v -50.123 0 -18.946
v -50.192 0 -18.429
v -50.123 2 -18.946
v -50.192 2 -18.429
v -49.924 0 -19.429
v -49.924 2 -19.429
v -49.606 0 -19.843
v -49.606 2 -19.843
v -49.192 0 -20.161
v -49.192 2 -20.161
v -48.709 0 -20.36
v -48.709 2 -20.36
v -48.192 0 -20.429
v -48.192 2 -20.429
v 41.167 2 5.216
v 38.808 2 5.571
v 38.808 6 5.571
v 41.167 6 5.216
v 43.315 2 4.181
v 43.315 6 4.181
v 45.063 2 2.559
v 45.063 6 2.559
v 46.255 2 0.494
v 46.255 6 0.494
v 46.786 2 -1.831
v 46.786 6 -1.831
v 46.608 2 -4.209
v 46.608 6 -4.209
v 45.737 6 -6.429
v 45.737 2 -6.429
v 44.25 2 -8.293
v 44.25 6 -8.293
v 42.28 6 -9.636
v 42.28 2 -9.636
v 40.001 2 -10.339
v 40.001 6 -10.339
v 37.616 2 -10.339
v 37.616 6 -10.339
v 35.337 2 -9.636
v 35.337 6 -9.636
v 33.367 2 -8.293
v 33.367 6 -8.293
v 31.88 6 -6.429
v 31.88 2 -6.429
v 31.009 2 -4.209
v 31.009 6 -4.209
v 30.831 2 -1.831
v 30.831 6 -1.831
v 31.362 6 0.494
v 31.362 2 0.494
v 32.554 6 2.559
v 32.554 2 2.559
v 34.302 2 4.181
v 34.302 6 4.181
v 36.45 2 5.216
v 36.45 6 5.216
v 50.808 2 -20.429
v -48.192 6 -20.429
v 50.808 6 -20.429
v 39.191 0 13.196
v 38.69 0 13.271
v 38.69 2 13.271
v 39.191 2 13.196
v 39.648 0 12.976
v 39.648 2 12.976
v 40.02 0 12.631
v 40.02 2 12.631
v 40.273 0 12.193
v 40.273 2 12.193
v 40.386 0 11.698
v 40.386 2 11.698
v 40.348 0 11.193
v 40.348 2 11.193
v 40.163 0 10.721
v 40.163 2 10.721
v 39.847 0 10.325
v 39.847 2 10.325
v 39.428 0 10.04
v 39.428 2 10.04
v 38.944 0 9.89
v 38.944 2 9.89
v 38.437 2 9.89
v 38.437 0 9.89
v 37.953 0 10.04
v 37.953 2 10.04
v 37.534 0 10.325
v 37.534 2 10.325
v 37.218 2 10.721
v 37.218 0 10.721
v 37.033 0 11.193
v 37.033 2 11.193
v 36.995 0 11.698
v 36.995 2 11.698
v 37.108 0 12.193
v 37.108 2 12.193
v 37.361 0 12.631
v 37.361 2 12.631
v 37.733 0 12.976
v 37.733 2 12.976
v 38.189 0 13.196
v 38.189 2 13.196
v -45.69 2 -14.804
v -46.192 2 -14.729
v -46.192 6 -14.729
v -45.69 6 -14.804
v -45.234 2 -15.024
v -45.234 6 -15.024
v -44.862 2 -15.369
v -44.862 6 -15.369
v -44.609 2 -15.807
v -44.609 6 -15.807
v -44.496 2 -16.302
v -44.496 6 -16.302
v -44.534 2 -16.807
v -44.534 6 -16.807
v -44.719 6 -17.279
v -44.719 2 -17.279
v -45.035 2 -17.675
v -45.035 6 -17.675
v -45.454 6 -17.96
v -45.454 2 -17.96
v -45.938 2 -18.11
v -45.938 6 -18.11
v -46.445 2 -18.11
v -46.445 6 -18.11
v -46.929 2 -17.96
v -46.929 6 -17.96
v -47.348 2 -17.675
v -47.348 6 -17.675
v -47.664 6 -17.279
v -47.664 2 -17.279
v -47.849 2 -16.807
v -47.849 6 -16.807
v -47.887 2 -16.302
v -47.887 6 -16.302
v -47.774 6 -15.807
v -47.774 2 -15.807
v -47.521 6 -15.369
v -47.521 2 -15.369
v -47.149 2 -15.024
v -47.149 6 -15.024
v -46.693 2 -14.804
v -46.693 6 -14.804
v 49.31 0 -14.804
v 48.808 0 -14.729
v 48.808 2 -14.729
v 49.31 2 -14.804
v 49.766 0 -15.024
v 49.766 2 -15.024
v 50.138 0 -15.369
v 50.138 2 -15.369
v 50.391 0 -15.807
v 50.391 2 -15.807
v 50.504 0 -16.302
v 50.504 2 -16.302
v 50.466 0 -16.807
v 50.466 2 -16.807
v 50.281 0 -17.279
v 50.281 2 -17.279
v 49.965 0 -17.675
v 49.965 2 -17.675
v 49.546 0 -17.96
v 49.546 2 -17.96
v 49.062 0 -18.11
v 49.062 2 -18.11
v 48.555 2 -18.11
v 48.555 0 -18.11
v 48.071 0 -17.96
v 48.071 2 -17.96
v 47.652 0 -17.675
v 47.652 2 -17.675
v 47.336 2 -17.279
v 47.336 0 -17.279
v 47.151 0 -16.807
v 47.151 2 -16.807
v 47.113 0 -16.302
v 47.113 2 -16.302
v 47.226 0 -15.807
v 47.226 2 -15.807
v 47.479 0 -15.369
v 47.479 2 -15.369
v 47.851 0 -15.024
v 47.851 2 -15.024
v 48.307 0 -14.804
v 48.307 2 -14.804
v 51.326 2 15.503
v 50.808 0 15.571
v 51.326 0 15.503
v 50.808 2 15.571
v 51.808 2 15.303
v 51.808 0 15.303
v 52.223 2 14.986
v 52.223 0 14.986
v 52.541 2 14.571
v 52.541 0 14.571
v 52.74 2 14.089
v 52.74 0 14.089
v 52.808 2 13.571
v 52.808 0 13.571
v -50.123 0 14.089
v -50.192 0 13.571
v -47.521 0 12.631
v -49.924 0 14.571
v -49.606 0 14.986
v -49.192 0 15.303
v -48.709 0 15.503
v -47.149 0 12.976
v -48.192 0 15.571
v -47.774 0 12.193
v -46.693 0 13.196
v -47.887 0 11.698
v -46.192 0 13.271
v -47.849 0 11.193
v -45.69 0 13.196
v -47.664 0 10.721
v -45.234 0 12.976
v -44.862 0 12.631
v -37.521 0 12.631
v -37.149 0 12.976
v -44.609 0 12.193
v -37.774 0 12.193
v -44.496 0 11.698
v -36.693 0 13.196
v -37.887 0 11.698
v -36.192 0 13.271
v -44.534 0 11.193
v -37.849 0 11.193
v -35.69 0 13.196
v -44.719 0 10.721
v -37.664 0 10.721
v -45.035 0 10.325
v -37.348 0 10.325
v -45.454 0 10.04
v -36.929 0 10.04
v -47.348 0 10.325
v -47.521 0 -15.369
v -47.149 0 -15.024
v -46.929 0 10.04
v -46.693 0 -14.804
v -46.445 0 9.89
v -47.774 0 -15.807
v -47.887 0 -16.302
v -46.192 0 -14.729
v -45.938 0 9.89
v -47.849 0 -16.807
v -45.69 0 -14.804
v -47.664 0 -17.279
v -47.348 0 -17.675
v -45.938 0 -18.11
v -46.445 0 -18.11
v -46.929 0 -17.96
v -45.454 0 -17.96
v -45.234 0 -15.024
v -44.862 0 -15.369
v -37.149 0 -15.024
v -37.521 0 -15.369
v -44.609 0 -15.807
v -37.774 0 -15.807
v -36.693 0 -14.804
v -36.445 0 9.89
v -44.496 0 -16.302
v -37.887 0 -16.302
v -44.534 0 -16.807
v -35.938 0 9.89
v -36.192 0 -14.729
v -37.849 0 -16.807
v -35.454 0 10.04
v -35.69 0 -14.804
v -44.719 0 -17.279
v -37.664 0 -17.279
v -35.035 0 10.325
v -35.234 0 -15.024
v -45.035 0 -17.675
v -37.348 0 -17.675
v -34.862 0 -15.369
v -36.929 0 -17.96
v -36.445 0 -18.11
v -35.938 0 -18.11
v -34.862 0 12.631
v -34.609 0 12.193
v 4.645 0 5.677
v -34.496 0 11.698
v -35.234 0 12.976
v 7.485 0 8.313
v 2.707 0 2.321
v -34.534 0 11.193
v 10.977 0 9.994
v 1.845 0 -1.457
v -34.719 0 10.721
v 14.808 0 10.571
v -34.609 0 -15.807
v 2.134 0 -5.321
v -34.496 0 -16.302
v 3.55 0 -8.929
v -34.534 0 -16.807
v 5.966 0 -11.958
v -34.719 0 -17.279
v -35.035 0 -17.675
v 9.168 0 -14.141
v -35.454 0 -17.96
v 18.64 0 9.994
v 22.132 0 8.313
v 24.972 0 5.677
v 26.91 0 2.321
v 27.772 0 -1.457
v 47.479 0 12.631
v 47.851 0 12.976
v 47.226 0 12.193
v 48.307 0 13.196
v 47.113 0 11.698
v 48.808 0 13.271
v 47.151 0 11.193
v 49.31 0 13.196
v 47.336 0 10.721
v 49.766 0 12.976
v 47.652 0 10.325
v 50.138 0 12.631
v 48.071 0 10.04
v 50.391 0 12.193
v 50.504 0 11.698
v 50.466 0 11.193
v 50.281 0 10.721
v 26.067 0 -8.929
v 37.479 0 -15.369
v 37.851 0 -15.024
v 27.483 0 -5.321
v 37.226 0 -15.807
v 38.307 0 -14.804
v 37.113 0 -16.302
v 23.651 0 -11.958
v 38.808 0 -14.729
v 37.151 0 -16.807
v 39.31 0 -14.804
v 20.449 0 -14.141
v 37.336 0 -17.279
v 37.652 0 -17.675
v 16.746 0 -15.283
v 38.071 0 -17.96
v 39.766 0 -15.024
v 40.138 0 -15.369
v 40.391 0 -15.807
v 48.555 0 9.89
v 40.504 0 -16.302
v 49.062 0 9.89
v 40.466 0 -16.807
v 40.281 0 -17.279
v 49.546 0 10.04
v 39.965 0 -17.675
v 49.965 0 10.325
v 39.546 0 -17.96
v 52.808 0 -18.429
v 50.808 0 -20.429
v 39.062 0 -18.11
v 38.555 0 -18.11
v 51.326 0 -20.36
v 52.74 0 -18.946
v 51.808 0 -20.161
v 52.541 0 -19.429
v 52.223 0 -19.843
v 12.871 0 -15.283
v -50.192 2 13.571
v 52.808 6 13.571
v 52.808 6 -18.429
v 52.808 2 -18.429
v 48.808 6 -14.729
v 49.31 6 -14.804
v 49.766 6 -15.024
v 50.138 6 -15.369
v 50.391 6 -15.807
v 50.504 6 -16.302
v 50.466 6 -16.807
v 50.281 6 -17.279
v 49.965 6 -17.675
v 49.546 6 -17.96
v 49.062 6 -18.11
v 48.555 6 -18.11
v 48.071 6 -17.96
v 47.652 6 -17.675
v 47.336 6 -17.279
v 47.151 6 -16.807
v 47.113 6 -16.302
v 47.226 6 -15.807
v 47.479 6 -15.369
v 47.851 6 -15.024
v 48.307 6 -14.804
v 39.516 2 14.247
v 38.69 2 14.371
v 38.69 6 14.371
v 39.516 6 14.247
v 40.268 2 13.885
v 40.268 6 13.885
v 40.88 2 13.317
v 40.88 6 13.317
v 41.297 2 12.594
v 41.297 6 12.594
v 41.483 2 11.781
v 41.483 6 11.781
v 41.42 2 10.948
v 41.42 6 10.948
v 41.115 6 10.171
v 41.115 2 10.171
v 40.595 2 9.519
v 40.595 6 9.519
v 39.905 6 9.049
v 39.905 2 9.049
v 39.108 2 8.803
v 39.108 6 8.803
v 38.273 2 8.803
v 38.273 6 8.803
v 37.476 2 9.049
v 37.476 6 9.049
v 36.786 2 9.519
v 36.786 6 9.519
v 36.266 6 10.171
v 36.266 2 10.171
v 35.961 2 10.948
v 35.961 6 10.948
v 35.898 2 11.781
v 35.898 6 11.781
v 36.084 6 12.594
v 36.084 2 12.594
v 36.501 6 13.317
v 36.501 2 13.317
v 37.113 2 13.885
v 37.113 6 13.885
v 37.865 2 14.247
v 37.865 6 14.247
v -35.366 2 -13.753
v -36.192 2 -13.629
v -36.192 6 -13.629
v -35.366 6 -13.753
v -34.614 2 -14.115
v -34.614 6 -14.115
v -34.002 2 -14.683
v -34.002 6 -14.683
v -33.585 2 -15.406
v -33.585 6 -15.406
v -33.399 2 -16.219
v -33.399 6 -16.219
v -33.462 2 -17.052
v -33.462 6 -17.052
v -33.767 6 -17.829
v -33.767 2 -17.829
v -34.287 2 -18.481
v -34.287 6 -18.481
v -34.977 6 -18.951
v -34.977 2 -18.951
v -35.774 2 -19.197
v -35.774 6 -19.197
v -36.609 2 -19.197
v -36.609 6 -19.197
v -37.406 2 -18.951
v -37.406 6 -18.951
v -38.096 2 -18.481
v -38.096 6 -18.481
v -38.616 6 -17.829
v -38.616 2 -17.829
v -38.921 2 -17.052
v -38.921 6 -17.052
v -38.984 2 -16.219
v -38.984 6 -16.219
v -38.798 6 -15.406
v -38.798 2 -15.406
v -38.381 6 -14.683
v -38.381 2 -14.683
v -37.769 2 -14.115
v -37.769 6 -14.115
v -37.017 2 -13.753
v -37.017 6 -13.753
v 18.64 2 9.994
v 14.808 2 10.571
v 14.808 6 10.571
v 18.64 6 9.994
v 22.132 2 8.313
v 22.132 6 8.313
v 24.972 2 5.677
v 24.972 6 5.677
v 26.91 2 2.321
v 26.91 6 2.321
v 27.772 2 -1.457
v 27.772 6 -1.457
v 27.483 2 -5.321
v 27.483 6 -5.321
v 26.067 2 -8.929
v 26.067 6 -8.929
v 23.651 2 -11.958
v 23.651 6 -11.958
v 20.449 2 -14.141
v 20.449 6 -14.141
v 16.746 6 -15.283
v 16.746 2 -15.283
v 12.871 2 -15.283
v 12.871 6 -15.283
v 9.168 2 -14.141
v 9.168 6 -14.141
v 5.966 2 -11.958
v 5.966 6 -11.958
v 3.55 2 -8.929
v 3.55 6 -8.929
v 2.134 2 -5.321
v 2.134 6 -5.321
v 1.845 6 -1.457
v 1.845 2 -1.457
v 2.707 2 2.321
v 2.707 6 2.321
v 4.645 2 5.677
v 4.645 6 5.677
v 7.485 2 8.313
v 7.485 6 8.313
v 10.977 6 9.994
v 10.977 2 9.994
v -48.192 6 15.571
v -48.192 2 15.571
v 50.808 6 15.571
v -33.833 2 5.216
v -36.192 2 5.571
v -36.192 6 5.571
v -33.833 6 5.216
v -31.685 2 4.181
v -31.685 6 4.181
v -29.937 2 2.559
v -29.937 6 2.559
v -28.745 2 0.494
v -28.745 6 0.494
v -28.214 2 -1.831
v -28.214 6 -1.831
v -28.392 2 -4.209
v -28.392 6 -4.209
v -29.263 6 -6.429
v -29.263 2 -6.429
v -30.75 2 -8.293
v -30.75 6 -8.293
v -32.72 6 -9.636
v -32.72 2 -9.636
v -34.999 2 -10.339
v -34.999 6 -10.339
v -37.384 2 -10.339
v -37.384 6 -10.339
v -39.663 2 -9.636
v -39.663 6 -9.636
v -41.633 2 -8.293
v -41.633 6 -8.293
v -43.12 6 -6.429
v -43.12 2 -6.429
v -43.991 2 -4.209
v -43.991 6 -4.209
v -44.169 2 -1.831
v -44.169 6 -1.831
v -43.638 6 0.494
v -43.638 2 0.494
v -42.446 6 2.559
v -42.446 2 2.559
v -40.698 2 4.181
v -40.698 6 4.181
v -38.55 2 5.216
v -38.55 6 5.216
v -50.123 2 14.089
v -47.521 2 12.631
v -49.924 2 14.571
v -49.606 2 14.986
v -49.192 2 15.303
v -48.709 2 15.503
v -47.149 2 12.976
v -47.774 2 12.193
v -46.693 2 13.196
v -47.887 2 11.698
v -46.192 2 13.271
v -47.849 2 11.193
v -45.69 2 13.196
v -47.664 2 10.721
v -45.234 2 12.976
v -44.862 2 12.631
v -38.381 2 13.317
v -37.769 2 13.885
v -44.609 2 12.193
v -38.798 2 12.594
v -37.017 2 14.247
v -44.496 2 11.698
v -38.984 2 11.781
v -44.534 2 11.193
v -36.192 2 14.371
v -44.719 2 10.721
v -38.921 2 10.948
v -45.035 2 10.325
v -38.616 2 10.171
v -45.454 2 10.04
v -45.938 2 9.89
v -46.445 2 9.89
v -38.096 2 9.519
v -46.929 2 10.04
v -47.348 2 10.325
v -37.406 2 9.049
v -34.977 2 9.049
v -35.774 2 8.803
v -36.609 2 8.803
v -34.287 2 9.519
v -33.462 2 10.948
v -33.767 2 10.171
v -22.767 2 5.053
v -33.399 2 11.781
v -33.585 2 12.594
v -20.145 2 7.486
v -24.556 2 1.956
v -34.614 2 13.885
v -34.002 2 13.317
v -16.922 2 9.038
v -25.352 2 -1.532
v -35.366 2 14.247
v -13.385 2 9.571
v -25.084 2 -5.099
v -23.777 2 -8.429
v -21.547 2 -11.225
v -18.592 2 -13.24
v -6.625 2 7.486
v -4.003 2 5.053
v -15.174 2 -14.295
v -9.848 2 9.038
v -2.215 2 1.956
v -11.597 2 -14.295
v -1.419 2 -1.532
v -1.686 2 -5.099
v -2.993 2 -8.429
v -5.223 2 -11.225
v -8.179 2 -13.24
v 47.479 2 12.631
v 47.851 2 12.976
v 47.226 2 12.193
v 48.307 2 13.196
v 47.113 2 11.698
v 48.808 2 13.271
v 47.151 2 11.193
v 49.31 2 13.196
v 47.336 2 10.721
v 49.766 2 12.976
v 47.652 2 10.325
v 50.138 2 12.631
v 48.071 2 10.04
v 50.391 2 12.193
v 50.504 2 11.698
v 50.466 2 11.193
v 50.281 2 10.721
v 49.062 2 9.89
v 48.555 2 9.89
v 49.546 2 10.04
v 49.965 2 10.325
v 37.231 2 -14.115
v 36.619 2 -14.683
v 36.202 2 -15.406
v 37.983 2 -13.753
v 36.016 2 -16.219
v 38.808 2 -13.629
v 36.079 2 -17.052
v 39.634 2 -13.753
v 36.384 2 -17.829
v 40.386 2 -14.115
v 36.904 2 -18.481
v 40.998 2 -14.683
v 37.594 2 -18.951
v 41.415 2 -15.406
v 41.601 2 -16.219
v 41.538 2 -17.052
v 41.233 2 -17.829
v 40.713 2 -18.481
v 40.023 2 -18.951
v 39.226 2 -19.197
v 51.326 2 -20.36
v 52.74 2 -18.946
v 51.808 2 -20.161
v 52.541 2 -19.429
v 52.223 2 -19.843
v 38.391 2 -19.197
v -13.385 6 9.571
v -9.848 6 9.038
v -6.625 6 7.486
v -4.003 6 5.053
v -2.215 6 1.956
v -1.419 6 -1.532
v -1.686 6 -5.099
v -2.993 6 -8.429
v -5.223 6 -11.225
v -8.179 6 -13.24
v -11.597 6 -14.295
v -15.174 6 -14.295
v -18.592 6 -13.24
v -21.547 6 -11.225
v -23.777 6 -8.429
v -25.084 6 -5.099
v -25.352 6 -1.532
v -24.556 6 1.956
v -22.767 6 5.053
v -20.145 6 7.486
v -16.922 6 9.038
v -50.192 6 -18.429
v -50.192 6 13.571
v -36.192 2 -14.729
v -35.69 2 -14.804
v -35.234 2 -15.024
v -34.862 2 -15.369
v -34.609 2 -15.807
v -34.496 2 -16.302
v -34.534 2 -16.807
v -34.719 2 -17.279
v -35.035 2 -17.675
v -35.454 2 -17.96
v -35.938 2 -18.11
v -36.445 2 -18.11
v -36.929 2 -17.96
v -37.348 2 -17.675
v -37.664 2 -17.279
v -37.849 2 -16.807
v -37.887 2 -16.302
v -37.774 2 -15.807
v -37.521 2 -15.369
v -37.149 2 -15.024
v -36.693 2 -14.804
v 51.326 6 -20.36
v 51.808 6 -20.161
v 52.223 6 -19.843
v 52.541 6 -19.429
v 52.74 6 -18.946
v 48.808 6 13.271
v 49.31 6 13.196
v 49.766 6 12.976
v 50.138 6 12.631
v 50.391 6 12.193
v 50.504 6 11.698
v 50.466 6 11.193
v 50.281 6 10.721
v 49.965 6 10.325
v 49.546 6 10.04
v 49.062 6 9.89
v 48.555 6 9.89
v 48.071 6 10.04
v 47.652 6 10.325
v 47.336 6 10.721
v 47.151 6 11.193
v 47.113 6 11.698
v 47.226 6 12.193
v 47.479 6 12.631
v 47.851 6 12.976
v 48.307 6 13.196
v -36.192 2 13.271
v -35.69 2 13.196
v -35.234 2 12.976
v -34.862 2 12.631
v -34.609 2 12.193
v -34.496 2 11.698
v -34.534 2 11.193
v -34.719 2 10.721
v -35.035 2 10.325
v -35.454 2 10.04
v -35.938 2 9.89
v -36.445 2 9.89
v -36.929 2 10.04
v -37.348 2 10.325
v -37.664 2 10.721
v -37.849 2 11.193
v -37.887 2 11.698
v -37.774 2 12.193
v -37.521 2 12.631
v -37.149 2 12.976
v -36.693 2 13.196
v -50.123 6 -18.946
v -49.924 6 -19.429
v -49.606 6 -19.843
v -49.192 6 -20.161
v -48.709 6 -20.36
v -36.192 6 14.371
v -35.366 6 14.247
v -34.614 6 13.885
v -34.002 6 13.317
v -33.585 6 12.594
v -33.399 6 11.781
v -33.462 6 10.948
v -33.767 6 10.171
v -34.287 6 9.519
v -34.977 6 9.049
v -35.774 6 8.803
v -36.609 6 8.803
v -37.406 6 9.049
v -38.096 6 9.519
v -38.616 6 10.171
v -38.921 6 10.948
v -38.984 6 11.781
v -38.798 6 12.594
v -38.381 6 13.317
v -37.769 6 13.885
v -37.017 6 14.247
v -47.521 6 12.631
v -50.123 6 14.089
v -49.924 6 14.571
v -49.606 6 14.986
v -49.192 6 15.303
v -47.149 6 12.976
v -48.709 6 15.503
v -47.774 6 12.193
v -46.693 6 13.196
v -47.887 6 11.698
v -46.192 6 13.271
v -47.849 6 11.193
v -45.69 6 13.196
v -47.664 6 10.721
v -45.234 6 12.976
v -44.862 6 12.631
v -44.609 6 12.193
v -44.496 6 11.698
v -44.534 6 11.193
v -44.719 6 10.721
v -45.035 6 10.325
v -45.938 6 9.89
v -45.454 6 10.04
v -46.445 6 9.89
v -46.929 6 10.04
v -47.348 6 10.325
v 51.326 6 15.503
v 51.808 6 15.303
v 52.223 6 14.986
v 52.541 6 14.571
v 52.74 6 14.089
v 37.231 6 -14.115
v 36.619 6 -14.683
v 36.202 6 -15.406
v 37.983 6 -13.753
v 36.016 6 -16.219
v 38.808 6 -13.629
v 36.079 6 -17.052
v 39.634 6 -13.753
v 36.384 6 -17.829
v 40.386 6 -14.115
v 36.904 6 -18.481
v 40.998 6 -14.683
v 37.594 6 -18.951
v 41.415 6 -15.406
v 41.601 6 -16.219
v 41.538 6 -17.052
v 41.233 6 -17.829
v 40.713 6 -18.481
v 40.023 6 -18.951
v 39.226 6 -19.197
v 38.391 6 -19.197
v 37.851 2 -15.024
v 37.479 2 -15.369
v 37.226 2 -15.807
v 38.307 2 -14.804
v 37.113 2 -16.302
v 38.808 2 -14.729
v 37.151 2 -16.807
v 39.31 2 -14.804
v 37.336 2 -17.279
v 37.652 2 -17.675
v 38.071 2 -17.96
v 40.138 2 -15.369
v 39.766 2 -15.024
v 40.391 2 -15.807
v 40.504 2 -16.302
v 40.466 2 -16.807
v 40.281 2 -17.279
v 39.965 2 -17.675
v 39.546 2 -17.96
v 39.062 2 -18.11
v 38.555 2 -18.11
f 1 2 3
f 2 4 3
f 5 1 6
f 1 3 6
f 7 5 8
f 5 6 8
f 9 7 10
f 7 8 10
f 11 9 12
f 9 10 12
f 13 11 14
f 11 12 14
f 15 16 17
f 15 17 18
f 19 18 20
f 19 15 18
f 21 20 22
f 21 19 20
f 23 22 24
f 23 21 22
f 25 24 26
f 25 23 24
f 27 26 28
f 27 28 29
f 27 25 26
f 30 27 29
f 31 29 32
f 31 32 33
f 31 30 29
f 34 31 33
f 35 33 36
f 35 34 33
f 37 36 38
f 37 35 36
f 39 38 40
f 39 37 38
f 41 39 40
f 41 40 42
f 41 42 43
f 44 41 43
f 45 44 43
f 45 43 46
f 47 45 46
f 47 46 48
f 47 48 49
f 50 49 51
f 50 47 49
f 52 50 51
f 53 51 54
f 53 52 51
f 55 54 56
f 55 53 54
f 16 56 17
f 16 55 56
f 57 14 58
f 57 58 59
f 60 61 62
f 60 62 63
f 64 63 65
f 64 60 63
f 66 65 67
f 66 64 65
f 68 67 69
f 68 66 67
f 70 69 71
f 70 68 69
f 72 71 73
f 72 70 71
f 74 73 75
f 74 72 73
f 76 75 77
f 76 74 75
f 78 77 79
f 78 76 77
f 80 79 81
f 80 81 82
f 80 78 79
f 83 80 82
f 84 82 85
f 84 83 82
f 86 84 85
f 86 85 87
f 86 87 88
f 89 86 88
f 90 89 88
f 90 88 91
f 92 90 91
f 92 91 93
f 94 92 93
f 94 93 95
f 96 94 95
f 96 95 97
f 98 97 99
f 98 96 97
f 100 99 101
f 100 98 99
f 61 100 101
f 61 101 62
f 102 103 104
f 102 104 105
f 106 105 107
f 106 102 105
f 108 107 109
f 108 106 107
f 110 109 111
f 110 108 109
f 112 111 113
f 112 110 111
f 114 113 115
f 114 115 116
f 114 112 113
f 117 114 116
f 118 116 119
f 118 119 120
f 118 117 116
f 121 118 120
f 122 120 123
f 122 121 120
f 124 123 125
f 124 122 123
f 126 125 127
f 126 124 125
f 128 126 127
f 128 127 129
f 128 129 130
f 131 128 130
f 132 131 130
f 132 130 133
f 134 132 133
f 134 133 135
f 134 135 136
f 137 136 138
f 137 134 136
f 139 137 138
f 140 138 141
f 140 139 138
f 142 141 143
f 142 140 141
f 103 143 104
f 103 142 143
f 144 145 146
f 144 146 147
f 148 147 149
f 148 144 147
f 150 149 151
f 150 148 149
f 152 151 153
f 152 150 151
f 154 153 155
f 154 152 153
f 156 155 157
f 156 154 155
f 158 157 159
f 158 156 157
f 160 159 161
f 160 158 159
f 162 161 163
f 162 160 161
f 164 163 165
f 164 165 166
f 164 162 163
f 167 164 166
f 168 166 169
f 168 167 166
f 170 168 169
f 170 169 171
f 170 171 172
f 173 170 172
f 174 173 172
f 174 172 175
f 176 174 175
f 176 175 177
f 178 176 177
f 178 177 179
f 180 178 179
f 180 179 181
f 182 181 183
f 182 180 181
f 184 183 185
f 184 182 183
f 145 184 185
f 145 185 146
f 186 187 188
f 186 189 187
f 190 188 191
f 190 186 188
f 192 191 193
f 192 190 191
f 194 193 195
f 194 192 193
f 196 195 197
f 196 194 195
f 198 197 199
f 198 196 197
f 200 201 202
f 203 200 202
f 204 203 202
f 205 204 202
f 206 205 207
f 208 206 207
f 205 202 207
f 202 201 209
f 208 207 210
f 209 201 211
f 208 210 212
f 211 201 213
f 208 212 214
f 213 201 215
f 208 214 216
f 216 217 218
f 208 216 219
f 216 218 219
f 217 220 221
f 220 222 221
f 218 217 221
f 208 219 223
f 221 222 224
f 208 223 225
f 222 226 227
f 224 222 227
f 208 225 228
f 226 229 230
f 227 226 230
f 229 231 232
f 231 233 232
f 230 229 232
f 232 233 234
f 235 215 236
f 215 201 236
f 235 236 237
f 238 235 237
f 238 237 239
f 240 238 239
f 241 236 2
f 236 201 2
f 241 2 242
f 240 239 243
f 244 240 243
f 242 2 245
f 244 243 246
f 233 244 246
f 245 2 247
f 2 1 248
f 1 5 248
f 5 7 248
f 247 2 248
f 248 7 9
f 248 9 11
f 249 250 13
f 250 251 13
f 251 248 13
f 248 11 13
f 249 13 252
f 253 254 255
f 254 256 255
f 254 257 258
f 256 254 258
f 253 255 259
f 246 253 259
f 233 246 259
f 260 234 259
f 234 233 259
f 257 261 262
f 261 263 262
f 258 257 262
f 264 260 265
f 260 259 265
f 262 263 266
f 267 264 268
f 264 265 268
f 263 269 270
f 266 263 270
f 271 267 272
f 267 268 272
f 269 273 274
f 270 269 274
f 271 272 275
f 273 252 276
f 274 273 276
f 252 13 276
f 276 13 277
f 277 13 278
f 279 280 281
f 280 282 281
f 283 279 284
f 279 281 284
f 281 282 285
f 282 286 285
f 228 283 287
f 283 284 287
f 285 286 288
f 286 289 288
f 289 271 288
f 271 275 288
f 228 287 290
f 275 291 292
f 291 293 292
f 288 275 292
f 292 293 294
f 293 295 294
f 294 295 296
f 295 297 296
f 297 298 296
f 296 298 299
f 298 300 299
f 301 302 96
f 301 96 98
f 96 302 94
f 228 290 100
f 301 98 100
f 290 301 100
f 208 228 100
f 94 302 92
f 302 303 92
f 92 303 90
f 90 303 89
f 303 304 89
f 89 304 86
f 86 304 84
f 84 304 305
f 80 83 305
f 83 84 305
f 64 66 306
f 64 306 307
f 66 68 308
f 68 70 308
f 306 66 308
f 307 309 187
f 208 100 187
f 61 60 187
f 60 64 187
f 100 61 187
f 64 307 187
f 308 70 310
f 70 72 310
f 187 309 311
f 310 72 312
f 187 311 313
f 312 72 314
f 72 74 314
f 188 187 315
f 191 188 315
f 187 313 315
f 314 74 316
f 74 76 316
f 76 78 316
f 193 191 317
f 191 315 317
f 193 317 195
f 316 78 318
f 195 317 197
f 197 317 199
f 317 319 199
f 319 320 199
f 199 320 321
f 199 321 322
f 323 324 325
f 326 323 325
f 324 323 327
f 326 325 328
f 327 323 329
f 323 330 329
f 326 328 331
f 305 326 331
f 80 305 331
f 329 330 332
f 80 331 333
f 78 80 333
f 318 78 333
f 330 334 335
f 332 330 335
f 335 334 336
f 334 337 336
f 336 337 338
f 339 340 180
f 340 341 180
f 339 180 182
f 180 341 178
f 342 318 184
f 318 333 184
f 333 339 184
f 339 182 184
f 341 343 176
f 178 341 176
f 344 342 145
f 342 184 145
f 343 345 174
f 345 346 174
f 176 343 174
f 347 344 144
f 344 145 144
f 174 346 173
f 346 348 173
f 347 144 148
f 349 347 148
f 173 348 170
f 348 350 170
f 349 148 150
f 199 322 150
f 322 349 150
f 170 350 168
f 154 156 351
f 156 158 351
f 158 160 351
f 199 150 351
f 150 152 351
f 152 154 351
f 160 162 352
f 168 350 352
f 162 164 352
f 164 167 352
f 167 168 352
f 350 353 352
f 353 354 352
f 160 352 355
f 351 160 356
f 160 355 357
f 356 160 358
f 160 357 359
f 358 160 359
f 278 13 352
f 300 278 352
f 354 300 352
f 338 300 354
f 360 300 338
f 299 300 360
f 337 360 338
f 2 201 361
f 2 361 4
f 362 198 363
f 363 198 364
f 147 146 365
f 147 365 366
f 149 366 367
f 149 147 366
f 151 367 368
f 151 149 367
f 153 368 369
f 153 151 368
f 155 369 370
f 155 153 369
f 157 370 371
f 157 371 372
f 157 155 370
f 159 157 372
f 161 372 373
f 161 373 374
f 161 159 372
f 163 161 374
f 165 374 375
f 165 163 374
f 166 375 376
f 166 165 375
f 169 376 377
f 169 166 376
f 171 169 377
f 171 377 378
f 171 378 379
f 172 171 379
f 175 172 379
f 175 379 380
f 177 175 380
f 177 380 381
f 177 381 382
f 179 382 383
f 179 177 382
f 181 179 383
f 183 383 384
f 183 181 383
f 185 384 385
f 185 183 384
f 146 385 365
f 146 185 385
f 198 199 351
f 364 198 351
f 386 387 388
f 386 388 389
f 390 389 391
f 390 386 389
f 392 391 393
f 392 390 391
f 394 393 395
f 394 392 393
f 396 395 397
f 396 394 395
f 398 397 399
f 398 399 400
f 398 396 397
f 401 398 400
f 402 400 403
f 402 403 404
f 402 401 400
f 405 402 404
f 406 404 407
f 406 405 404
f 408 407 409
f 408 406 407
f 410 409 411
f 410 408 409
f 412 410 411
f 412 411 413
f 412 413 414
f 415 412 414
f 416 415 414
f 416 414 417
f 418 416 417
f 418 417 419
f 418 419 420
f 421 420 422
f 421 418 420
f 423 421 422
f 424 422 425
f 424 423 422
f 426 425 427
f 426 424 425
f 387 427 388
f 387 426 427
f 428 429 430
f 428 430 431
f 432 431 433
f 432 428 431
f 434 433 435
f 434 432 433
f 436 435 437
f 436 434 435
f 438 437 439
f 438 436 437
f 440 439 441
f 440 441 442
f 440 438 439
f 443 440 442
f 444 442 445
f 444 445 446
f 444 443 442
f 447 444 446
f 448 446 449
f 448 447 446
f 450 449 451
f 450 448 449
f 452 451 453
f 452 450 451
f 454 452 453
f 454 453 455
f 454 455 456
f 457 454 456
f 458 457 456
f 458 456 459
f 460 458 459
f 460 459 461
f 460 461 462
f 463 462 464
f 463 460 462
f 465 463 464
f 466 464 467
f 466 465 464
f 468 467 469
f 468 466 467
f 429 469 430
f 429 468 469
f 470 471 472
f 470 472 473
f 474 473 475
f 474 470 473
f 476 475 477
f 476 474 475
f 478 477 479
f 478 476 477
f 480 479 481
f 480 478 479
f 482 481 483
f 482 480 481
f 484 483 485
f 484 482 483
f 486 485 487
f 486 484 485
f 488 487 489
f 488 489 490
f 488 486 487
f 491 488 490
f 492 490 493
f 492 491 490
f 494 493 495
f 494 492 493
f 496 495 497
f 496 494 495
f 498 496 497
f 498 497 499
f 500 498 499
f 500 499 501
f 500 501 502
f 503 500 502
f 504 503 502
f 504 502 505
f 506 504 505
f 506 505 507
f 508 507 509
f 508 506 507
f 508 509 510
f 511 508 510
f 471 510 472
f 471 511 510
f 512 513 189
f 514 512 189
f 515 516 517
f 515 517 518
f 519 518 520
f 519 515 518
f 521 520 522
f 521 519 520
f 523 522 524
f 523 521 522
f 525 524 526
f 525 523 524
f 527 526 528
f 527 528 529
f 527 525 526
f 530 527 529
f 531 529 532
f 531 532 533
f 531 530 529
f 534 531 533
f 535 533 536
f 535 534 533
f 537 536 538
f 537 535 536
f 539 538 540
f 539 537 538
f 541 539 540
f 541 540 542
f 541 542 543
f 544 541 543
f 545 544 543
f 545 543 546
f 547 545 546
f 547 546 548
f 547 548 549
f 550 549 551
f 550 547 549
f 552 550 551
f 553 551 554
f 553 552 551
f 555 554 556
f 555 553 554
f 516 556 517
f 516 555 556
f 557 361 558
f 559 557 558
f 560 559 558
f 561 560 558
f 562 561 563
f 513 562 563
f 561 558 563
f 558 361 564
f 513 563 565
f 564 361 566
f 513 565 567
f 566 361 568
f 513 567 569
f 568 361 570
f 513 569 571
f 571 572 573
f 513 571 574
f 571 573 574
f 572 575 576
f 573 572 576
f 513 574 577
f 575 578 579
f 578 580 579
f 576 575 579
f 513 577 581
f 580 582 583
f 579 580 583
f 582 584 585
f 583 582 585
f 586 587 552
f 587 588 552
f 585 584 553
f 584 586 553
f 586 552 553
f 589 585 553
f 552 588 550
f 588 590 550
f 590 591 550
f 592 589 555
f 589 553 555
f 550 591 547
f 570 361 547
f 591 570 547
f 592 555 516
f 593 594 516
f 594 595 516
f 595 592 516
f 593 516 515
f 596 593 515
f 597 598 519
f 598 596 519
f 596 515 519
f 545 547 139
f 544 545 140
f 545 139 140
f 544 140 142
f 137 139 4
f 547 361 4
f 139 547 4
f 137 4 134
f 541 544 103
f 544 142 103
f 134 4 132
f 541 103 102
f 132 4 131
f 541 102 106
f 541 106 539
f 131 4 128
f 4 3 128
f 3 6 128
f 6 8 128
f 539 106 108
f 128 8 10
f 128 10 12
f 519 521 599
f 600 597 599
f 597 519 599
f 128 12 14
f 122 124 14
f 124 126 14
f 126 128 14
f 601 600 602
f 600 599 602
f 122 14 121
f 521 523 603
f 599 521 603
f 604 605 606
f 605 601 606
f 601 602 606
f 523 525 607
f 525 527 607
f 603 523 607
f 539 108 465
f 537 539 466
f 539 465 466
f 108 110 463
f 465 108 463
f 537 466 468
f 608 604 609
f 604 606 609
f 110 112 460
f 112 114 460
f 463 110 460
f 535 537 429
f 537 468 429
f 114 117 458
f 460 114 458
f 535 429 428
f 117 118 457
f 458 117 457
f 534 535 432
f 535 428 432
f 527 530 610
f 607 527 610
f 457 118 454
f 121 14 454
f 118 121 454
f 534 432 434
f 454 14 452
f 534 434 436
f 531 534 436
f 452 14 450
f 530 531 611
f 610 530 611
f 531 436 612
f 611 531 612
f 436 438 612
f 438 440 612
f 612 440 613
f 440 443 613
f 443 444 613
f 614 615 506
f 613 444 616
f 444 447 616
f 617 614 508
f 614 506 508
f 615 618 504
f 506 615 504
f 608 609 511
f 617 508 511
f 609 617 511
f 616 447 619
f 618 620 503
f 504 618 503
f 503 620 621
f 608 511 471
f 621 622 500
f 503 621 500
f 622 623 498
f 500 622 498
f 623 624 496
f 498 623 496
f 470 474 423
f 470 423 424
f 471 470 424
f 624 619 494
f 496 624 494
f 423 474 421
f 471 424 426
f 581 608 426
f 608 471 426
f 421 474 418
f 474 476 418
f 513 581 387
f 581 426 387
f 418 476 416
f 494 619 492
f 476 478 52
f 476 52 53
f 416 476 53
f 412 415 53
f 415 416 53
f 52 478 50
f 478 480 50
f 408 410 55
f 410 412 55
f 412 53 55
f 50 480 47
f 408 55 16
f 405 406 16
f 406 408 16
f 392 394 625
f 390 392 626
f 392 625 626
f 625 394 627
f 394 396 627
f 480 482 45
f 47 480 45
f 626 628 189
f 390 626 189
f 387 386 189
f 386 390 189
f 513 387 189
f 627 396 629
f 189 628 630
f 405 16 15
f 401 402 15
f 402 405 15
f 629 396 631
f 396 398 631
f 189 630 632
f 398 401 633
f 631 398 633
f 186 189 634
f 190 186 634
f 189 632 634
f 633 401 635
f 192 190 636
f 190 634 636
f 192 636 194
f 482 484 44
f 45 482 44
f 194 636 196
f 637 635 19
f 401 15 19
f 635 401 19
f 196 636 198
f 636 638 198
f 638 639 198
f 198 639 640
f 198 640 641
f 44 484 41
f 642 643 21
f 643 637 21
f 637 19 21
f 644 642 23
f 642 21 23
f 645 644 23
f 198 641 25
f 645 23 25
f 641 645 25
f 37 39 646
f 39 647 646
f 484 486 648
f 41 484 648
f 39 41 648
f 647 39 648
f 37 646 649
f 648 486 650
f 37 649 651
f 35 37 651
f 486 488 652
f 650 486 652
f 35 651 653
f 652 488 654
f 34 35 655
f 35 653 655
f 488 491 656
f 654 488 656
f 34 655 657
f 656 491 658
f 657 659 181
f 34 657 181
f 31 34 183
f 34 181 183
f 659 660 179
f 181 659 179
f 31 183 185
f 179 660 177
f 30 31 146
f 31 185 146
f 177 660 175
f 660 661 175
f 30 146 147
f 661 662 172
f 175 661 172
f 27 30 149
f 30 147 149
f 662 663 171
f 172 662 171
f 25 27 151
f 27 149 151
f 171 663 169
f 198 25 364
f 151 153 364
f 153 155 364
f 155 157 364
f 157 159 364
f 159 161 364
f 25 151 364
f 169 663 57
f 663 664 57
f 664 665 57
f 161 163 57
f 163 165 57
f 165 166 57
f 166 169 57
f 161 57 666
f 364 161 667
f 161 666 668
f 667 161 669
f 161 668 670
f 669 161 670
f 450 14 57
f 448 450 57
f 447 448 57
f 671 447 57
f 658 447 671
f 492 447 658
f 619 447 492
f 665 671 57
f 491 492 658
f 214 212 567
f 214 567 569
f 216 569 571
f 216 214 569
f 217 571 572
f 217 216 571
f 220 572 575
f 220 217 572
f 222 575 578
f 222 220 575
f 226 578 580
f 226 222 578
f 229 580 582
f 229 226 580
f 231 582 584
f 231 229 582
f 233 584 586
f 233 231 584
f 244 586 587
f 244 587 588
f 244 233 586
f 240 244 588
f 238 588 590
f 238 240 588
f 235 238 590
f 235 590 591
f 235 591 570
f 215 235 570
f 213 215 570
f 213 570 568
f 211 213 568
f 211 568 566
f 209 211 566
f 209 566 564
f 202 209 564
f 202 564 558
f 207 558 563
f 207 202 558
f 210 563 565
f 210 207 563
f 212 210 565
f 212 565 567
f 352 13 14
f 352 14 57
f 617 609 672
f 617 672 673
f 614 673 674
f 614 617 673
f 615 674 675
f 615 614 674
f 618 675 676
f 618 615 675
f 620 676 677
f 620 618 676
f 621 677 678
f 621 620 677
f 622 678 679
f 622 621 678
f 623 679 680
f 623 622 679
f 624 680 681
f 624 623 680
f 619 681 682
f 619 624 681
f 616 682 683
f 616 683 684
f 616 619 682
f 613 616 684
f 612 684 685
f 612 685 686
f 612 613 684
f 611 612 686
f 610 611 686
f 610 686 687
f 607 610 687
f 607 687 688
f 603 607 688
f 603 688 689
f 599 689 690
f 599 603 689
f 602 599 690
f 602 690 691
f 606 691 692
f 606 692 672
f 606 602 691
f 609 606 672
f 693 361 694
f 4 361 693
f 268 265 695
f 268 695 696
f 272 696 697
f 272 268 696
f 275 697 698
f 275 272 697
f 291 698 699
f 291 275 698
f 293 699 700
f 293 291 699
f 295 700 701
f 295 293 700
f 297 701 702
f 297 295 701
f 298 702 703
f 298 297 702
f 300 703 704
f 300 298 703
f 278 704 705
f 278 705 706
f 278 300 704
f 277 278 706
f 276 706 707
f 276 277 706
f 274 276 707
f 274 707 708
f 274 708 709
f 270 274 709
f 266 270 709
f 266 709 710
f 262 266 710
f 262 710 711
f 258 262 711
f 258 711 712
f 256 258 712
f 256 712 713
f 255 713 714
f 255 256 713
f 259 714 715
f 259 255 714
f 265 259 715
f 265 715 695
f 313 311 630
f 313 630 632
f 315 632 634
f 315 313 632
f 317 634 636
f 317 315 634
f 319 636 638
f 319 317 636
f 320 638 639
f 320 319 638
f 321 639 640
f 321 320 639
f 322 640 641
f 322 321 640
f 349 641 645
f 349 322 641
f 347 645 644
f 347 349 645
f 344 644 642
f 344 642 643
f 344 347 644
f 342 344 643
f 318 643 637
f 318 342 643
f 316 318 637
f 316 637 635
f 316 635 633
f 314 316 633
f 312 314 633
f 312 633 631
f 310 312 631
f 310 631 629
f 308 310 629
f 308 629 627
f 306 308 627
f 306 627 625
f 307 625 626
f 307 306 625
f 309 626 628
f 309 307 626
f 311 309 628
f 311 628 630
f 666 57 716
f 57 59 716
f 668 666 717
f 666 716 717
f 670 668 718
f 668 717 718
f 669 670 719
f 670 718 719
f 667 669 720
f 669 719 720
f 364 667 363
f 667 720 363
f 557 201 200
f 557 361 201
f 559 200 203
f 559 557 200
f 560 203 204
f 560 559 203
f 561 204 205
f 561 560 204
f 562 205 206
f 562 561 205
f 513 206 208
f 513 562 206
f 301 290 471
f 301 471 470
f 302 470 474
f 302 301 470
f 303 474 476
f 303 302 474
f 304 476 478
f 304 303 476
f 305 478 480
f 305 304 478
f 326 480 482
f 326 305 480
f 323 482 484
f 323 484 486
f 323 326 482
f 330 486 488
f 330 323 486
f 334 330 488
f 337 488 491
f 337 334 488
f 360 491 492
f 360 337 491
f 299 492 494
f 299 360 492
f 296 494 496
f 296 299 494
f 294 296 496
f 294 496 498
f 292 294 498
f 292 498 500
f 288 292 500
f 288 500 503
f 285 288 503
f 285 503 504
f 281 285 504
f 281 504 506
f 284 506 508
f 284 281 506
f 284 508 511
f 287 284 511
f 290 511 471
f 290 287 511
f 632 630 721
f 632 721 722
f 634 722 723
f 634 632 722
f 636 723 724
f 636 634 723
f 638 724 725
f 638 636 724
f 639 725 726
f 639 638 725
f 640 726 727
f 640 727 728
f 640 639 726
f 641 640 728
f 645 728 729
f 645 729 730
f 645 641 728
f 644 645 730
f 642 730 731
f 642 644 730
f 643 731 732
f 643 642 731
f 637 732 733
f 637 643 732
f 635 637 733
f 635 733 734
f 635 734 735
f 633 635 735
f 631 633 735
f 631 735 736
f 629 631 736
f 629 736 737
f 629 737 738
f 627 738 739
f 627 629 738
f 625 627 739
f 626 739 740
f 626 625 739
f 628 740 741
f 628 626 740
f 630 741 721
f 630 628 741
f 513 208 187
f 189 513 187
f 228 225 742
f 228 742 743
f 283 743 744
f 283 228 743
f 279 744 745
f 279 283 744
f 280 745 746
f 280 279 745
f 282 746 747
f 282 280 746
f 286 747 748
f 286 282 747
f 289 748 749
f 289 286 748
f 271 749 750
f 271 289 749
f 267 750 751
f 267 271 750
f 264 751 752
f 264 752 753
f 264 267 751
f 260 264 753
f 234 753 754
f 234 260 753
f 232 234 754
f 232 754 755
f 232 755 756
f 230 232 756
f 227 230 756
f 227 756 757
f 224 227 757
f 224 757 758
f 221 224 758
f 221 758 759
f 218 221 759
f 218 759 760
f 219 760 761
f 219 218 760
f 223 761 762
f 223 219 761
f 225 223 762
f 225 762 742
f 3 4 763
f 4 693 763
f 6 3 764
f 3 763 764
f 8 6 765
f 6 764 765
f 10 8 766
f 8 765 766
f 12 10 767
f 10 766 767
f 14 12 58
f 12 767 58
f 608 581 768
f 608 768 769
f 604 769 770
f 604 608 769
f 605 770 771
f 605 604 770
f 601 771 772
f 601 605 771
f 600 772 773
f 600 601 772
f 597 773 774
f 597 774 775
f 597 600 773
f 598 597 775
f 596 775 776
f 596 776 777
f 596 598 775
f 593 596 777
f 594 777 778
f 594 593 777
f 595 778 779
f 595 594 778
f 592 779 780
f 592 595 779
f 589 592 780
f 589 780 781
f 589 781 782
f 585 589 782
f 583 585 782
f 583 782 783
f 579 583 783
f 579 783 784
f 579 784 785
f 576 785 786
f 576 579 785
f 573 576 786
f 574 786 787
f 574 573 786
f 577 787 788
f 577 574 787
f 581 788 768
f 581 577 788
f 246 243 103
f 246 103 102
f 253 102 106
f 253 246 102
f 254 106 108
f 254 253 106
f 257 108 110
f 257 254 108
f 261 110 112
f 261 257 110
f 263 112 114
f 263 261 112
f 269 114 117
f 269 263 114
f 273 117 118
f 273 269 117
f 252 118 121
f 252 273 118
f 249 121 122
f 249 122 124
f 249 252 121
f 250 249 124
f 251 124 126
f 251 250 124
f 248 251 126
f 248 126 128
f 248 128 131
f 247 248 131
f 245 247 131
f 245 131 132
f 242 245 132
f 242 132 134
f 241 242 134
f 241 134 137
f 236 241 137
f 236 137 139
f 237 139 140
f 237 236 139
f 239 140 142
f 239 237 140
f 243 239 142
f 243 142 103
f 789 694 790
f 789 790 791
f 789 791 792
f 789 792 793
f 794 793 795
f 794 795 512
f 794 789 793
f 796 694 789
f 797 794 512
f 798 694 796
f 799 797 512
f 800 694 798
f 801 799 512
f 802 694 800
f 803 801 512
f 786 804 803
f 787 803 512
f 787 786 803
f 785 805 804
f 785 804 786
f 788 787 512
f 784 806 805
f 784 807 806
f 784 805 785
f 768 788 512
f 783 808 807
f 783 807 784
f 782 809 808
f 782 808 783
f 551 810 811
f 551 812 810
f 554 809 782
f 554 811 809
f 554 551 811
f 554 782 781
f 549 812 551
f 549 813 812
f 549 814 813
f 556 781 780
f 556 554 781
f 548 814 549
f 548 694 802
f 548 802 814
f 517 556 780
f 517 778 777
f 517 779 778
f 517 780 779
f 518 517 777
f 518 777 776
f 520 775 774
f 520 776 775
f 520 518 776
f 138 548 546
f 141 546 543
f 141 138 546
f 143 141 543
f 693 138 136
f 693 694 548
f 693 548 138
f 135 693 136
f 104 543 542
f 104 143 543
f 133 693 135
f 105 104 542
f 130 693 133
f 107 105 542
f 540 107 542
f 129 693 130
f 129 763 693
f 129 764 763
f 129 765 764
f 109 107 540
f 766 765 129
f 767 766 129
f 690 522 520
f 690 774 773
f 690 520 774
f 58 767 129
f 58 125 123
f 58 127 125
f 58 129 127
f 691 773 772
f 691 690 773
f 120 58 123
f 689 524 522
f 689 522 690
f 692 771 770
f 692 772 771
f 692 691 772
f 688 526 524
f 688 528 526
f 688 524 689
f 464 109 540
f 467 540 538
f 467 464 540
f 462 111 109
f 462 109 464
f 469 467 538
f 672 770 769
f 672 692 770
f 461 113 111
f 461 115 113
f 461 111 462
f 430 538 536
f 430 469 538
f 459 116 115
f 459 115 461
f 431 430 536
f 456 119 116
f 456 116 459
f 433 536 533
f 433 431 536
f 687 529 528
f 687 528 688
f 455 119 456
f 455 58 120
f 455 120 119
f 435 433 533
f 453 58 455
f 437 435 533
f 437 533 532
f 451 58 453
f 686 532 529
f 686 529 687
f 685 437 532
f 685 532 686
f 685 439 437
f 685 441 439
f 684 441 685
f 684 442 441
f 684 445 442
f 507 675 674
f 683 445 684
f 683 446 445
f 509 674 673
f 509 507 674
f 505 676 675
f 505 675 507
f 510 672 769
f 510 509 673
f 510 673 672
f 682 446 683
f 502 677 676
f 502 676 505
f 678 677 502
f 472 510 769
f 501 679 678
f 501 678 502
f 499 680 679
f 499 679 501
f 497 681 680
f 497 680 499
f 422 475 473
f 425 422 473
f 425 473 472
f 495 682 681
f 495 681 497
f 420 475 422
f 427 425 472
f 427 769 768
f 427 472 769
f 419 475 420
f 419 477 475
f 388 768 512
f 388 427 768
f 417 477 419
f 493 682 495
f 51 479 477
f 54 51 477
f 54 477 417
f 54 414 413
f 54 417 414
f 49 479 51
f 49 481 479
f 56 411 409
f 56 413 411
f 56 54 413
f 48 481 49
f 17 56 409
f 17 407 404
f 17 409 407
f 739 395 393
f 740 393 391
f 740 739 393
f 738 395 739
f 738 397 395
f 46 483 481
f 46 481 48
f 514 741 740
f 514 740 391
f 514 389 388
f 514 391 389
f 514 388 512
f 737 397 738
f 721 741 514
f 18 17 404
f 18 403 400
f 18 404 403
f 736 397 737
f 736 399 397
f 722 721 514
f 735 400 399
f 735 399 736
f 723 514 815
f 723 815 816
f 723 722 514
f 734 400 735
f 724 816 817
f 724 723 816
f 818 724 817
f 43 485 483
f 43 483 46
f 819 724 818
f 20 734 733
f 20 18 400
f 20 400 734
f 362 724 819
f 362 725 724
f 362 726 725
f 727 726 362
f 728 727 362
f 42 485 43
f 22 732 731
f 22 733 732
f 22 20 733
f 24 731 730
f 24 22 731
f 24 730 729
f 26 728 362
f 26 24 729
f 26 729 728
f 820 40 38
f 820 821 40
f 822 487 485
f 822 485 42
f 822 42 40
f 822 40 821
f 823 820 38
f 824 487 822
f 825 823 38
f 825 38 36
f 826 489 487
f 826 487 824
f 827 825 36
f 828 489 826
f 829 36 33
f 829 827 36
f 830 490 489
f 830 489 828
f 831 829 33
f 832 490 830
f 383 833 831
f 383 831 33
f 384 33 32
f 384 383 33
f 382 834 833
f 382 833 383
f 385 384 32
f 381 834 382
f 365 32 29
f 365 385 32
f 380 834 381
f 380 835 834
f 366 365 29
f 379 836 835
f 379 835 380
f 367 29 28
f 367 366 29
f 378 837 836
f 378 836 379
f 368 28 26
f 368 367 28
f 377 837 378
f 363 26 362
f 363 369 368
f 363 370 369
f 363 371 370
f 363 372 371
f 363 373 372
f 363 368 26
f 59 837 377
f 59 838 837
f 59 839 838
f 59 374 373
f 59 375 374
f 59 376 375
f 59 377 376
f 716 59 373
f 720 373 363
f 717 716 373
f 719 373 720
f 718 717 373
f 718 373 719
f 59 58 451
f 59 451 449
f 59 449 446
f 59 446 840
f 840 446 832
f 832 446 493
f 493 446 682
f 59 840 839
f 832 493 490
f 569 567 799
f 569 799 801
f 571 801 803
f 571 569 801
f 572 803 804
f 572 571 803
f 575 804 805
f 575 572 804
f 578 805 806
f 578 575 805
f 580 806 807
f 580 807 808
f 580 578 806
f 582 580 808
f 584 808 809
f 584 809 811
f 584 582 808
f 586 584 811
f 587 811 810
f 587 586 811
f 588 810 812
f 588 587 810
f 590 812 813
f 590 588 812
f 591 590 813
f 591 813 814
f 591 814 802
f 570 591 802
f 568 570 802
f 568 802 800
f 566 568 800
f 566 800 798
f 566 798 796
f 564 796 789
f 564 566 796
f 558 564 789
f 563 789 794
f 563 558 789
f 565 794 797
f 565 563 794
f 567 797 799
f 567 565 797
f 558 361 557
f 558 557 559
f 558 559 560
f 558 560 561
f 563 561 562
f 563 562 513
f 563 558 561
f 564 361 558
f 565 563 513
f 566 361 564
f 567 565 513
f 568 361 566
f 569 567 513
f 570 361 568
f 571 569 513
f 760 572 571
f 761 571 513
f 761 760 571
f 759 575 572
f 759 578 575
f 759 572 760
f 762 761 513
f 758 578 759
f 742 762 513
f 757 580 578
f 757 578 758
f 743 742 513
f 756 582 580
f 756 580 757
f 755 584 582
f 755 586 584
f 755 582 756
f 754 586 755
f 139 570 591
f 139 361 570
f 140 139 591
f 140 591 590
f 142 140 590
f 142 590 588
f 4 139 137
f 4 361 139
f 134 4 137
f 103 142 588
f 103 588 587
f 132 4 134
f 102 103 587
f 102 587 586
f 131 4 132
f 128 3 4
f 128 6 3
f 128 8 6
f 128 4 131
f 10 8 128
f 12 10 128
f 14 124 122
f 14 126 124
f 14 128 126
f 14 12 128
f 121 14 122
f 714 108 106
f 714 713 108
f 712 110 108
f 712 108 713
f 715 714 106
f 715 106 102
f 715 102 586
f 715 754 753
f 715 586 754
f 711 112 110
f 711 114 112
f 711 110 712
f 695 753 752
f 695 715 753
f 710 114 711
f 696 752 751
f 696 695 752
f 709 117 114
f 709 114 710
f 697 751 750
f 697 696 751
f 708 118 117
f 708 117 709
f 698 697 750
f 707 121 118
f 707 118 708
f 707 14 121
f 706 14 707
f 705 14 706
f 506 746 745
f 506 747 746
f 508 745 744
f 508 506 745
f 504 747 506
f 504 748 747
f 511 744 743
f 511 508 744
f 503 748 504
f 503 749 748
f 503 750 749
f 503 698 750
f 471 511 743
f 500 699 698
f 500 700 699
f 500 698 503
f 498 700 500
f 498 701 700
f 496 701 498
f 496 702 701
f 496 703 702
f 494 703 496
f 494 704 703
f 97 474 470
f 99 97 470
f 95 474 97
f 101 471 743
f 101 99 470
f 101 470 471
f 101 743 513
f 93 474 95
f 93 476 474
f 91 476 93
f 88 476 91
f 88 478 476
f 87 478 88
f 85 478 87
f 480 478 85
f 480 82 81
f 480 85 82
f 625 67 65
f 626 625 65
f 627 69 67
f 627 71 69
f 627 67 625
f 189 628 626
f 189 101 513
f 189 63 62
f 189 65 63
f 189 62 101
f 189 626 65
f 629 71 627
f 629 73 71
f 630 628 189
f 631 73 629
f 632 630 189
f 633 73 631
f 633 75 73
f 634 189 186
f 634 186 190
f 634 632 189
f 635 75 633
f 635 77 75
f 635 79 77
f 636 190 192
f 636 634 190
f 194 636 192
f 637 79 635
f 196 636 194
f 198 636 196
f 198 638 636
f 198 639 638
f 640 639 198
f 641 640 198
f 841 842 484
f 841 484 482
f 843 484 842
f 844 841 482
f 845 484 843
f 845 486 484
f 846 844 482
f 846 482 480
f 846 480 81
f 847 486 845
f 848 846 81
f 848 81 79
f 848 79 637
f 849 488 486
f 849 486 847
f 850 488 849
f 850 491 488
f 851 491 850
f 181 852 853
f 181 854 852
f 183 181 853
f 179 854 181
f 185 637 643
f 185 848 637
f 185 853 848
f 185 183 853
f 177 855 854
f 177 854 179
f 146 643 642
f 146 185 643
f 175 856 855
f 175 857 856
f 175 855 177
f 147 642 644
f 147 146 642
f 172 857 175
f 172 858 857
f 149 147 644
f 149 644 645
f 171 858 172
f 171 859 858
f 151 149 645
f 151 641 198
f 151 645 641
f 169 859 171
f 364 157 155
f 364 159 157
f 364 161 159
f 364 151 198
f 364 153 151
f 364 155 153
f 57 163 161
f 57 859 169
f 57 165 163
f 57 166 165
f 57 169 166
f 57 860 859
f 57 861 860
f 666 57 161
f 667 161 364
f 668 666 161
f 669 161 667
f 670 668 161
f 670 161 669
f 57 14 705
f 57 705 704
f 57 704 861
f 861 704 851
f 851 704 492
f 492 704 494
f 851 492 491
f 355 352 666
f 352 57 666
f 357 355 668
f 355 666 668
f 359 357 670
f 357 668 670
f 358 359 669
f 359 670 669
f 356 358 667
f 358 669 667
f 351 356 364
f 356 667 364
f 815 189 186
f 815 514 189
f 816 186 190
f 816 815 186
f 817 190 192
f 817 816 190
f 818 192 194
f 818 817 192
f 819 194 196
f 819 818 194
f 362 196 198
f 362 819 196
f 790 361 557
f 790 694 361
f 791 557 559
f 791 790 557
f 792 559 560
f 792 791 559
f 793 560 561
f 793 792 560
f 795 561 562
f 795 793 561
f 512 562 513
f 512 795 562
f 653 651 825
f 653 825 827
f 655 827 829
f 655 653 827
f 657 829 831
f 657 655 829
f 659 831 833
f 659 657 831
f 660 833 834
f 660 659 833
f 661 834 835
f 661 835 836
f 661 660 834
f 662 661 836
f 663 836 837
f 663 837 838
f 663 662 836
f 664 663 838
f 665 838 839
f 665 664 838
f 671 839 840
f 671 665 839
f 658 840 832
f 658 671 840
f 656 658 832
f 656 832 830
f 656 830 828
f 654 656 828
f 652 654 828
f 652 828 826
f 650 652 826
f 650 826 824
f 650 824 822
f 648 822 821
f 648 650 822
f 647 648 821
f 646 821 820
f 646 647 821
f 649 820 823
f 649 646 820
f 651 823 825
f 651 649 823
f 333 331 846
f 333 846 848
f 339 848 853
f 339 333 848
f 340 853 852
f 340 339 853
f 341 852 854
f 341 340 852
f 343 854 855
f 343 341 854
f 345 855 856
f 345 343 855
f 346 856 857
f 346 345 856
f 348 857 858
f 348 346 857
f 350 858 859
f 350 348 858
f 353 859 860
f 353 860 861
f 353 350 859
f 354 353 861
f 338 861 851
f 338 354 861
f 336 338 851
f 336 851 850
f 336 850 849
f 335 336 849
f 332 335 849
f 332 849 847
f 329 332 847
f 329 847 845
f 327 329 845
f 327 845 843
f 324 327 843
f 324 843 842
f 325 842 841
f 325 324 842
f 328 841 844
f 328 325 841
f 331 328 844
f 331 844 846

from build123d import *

# Parameters (mm, degrees)
SKETCH2_W           = 103
SKETCH2_H           = 36
SKETCH2_R           = 1.7
SKETCH2_R_2         = 13
BOSS_EXTRUDE1_DEPTH = 2
FILLET1_R           = 2
SKETCH6_W           = 103
SKETCH6_H           = 36
SKETCH6_R           = 1.7
SKETCH6_R_2         = 13
SKETCH6_R_3         = 2.8
SKETCH6_R_4         = 8
SKETCH6_R_5         = 12
BOSS_EXTRUDE3_DEPTH = 4
FILLET2_R           = 2


with BuildPart() as part:
    # Sketch2 → Boss-Extrude1 (new body)
    with BuildSketch(Plane(origin=(0, 0, 0), x_dir=(1, 0, 0), z_dir=(0, 1, 0))):
        with Locations((1.308496413, 2.428579377)):
            Rectangle(SKETCH2_W, SKETCH2_H)
        with Locations(Location((-46.191503587, 16.428579377, 0), (0, 0, 270))):
            Circle(SKETCH2_R, mode=Mode.SUBTRACT)
        with Locations(Location((-46.191503587, -11.571420623, 0), (0, 0, 270))):
            Circle(SKETCH2_R, mode=Mode.SUBTRACT)
        with Locations(Location((48.808496413, 16.428579377, 0), (0, 0, 270))):
            Circle(SKETCH2_R, mode=Mode.SUBTRACT)
        with Locations(Location((48.808496413, -11.571420623, 0), (0, 0, 270))):
            Circle(SKETCH2_R, mode=Mode.SUBTRACT)
        with Locations(Location((14.808496413, 2.428579377, 0), (0, 0, 270))):
            Circle(SKETCH2_R_2, mode=Mode.SUBTRACT)
        with Locations(Location((-36.191503587, 16.428579377, 0), (0, 0, 270))):
            Circle(SKETCH2_R, mode=Mode.SUBTRACT)
        with Locations(Location((-36.191503587, -11.571420623, 0), (0, 0, 270))):
            Circle(SKETCH2_R, mode=Mode.SUBTRACT)
        with Locations(Location((38.808496413, 16.428579377, 0), (0, 0, 270))):
            Circle(SKETCH2_R, mode=Mode.SUBTRACT)
        with Locations(Location((38.690387475, -11.571420623, 0), (0, 0, 270))):
            Circle(SKETCH2_R, mode=Mode.SUBTRACT)
    extrude(amount=BOSS_EXTRUDE1_DEPTH)

    # Fillet1
    fillet1_edges = [part.edges().sort_by_distance(p)[0] for p in [
        (-50.191503587, 1, -20.428579377),
        (52.808496413, 1, -20.428579377),
        (52.808496413, 1, 15.571420623),
        (-50.191503587, 1, 15.571420623),
    ]]
    fillet(fillet1_edges, radius=FILLET1_R)


with BuildPart() as body_2:
    # Sketch6 → Boss-Extrude3 (new body)
    with BuildSketch(Plane(origin=(0, 2, 0), x_dir=(1, 0, 0), z_dir=(0, 1, 0))):
        with Locations((1.308496413, 2.428579377)):
            Rectangle(SKETCH6_W, SKETCH6_H)
        with Locations(Location((-46.191503587, 16.428579377, 0), (0, 0, 270))):
            Circle(SKETCH6_R, mode=Mode.SUBTRACT)
        with Locations(Location((-46.191503587, -11.571420623, 0), (0, 0, 270))):
            Circle(SKETCH6_R, mode=Mode.SUBTRACT)
        with Locations(Location((48.808496413, 16.428579377, 0), (0, 0, 270))):
            Circle(SKETCH6_R, mode=Mode.SUBTRACT)
        with Locations(Location((48.808496413, -11.571420623, 0), (0, 0, 270))):
            Circle(SKETCH6_R, mode=Mode.SUBTRACT)
        with Locations(Location((14.808496413, 2.428579377, 0), (0, 0, 270))):
            Circle(SKETCH6_R_2, mode=Mode.SUBTRACT)
        with Locations(Location((-36.191503587, 16.428579377, 0), (0, 0, 270))):
            Circle(SKETCH6_R_3, mode=Mode.SUBTRACT)
        with Locations(Location((-36.191503587, -11.571420623, 0), (0, 0, 270))):
            Circle(SKETCH6_R_3, mode=Mode.SUBTRACT)
        with Locations(Location((38.808496413, 16.428579377, 0), (0, 0, 270))):
            Circle(SKETCH6_R_3, mode=Mode.SUBTRACT)
        with Locations(Location((38.690387475, -11.571420623, 0), (0, 0, 270))):
            Circle(SKETCH6_R_3, mode=Mode.SUBTRACT)
        with Locations(Location((-36.191503587, 2.428579377, 0), (0, 0, 270))):
            Circle(SKETCH6_R_4, mode=Mode.SUBTRACT)
        with Locations(Location((-13.385120941, 2.428579377, 0), (0, 0, 270))):
            Circle(SKETCH6_R_5, mode=Mode.SUBTRACT)
        with Locations(Location((38.808496413, 2.428579377, 0), (0, 0, 270))):
            Circle(SKETCH6_R_4, mode=Mode.SUBTRACT)
    extrude(amount=BOSS_EXTRUDE3_DEPTH)

    # Fillet2
    fillet2_edges = [body_2.edges().sort_by_distance(p)[0] for p in [
        (-50.191503587, 4, -20.428579377),
        (52.808496413, 4, -20.428579377),
        (52.808496413, 4, 15.571420623),
        (-50.191503587, 4, 15.571420623),
    ]]
    fillet(fillet2_edges, radius=FILLET2_R)


solid = Compound([part.part, body_2.part])
